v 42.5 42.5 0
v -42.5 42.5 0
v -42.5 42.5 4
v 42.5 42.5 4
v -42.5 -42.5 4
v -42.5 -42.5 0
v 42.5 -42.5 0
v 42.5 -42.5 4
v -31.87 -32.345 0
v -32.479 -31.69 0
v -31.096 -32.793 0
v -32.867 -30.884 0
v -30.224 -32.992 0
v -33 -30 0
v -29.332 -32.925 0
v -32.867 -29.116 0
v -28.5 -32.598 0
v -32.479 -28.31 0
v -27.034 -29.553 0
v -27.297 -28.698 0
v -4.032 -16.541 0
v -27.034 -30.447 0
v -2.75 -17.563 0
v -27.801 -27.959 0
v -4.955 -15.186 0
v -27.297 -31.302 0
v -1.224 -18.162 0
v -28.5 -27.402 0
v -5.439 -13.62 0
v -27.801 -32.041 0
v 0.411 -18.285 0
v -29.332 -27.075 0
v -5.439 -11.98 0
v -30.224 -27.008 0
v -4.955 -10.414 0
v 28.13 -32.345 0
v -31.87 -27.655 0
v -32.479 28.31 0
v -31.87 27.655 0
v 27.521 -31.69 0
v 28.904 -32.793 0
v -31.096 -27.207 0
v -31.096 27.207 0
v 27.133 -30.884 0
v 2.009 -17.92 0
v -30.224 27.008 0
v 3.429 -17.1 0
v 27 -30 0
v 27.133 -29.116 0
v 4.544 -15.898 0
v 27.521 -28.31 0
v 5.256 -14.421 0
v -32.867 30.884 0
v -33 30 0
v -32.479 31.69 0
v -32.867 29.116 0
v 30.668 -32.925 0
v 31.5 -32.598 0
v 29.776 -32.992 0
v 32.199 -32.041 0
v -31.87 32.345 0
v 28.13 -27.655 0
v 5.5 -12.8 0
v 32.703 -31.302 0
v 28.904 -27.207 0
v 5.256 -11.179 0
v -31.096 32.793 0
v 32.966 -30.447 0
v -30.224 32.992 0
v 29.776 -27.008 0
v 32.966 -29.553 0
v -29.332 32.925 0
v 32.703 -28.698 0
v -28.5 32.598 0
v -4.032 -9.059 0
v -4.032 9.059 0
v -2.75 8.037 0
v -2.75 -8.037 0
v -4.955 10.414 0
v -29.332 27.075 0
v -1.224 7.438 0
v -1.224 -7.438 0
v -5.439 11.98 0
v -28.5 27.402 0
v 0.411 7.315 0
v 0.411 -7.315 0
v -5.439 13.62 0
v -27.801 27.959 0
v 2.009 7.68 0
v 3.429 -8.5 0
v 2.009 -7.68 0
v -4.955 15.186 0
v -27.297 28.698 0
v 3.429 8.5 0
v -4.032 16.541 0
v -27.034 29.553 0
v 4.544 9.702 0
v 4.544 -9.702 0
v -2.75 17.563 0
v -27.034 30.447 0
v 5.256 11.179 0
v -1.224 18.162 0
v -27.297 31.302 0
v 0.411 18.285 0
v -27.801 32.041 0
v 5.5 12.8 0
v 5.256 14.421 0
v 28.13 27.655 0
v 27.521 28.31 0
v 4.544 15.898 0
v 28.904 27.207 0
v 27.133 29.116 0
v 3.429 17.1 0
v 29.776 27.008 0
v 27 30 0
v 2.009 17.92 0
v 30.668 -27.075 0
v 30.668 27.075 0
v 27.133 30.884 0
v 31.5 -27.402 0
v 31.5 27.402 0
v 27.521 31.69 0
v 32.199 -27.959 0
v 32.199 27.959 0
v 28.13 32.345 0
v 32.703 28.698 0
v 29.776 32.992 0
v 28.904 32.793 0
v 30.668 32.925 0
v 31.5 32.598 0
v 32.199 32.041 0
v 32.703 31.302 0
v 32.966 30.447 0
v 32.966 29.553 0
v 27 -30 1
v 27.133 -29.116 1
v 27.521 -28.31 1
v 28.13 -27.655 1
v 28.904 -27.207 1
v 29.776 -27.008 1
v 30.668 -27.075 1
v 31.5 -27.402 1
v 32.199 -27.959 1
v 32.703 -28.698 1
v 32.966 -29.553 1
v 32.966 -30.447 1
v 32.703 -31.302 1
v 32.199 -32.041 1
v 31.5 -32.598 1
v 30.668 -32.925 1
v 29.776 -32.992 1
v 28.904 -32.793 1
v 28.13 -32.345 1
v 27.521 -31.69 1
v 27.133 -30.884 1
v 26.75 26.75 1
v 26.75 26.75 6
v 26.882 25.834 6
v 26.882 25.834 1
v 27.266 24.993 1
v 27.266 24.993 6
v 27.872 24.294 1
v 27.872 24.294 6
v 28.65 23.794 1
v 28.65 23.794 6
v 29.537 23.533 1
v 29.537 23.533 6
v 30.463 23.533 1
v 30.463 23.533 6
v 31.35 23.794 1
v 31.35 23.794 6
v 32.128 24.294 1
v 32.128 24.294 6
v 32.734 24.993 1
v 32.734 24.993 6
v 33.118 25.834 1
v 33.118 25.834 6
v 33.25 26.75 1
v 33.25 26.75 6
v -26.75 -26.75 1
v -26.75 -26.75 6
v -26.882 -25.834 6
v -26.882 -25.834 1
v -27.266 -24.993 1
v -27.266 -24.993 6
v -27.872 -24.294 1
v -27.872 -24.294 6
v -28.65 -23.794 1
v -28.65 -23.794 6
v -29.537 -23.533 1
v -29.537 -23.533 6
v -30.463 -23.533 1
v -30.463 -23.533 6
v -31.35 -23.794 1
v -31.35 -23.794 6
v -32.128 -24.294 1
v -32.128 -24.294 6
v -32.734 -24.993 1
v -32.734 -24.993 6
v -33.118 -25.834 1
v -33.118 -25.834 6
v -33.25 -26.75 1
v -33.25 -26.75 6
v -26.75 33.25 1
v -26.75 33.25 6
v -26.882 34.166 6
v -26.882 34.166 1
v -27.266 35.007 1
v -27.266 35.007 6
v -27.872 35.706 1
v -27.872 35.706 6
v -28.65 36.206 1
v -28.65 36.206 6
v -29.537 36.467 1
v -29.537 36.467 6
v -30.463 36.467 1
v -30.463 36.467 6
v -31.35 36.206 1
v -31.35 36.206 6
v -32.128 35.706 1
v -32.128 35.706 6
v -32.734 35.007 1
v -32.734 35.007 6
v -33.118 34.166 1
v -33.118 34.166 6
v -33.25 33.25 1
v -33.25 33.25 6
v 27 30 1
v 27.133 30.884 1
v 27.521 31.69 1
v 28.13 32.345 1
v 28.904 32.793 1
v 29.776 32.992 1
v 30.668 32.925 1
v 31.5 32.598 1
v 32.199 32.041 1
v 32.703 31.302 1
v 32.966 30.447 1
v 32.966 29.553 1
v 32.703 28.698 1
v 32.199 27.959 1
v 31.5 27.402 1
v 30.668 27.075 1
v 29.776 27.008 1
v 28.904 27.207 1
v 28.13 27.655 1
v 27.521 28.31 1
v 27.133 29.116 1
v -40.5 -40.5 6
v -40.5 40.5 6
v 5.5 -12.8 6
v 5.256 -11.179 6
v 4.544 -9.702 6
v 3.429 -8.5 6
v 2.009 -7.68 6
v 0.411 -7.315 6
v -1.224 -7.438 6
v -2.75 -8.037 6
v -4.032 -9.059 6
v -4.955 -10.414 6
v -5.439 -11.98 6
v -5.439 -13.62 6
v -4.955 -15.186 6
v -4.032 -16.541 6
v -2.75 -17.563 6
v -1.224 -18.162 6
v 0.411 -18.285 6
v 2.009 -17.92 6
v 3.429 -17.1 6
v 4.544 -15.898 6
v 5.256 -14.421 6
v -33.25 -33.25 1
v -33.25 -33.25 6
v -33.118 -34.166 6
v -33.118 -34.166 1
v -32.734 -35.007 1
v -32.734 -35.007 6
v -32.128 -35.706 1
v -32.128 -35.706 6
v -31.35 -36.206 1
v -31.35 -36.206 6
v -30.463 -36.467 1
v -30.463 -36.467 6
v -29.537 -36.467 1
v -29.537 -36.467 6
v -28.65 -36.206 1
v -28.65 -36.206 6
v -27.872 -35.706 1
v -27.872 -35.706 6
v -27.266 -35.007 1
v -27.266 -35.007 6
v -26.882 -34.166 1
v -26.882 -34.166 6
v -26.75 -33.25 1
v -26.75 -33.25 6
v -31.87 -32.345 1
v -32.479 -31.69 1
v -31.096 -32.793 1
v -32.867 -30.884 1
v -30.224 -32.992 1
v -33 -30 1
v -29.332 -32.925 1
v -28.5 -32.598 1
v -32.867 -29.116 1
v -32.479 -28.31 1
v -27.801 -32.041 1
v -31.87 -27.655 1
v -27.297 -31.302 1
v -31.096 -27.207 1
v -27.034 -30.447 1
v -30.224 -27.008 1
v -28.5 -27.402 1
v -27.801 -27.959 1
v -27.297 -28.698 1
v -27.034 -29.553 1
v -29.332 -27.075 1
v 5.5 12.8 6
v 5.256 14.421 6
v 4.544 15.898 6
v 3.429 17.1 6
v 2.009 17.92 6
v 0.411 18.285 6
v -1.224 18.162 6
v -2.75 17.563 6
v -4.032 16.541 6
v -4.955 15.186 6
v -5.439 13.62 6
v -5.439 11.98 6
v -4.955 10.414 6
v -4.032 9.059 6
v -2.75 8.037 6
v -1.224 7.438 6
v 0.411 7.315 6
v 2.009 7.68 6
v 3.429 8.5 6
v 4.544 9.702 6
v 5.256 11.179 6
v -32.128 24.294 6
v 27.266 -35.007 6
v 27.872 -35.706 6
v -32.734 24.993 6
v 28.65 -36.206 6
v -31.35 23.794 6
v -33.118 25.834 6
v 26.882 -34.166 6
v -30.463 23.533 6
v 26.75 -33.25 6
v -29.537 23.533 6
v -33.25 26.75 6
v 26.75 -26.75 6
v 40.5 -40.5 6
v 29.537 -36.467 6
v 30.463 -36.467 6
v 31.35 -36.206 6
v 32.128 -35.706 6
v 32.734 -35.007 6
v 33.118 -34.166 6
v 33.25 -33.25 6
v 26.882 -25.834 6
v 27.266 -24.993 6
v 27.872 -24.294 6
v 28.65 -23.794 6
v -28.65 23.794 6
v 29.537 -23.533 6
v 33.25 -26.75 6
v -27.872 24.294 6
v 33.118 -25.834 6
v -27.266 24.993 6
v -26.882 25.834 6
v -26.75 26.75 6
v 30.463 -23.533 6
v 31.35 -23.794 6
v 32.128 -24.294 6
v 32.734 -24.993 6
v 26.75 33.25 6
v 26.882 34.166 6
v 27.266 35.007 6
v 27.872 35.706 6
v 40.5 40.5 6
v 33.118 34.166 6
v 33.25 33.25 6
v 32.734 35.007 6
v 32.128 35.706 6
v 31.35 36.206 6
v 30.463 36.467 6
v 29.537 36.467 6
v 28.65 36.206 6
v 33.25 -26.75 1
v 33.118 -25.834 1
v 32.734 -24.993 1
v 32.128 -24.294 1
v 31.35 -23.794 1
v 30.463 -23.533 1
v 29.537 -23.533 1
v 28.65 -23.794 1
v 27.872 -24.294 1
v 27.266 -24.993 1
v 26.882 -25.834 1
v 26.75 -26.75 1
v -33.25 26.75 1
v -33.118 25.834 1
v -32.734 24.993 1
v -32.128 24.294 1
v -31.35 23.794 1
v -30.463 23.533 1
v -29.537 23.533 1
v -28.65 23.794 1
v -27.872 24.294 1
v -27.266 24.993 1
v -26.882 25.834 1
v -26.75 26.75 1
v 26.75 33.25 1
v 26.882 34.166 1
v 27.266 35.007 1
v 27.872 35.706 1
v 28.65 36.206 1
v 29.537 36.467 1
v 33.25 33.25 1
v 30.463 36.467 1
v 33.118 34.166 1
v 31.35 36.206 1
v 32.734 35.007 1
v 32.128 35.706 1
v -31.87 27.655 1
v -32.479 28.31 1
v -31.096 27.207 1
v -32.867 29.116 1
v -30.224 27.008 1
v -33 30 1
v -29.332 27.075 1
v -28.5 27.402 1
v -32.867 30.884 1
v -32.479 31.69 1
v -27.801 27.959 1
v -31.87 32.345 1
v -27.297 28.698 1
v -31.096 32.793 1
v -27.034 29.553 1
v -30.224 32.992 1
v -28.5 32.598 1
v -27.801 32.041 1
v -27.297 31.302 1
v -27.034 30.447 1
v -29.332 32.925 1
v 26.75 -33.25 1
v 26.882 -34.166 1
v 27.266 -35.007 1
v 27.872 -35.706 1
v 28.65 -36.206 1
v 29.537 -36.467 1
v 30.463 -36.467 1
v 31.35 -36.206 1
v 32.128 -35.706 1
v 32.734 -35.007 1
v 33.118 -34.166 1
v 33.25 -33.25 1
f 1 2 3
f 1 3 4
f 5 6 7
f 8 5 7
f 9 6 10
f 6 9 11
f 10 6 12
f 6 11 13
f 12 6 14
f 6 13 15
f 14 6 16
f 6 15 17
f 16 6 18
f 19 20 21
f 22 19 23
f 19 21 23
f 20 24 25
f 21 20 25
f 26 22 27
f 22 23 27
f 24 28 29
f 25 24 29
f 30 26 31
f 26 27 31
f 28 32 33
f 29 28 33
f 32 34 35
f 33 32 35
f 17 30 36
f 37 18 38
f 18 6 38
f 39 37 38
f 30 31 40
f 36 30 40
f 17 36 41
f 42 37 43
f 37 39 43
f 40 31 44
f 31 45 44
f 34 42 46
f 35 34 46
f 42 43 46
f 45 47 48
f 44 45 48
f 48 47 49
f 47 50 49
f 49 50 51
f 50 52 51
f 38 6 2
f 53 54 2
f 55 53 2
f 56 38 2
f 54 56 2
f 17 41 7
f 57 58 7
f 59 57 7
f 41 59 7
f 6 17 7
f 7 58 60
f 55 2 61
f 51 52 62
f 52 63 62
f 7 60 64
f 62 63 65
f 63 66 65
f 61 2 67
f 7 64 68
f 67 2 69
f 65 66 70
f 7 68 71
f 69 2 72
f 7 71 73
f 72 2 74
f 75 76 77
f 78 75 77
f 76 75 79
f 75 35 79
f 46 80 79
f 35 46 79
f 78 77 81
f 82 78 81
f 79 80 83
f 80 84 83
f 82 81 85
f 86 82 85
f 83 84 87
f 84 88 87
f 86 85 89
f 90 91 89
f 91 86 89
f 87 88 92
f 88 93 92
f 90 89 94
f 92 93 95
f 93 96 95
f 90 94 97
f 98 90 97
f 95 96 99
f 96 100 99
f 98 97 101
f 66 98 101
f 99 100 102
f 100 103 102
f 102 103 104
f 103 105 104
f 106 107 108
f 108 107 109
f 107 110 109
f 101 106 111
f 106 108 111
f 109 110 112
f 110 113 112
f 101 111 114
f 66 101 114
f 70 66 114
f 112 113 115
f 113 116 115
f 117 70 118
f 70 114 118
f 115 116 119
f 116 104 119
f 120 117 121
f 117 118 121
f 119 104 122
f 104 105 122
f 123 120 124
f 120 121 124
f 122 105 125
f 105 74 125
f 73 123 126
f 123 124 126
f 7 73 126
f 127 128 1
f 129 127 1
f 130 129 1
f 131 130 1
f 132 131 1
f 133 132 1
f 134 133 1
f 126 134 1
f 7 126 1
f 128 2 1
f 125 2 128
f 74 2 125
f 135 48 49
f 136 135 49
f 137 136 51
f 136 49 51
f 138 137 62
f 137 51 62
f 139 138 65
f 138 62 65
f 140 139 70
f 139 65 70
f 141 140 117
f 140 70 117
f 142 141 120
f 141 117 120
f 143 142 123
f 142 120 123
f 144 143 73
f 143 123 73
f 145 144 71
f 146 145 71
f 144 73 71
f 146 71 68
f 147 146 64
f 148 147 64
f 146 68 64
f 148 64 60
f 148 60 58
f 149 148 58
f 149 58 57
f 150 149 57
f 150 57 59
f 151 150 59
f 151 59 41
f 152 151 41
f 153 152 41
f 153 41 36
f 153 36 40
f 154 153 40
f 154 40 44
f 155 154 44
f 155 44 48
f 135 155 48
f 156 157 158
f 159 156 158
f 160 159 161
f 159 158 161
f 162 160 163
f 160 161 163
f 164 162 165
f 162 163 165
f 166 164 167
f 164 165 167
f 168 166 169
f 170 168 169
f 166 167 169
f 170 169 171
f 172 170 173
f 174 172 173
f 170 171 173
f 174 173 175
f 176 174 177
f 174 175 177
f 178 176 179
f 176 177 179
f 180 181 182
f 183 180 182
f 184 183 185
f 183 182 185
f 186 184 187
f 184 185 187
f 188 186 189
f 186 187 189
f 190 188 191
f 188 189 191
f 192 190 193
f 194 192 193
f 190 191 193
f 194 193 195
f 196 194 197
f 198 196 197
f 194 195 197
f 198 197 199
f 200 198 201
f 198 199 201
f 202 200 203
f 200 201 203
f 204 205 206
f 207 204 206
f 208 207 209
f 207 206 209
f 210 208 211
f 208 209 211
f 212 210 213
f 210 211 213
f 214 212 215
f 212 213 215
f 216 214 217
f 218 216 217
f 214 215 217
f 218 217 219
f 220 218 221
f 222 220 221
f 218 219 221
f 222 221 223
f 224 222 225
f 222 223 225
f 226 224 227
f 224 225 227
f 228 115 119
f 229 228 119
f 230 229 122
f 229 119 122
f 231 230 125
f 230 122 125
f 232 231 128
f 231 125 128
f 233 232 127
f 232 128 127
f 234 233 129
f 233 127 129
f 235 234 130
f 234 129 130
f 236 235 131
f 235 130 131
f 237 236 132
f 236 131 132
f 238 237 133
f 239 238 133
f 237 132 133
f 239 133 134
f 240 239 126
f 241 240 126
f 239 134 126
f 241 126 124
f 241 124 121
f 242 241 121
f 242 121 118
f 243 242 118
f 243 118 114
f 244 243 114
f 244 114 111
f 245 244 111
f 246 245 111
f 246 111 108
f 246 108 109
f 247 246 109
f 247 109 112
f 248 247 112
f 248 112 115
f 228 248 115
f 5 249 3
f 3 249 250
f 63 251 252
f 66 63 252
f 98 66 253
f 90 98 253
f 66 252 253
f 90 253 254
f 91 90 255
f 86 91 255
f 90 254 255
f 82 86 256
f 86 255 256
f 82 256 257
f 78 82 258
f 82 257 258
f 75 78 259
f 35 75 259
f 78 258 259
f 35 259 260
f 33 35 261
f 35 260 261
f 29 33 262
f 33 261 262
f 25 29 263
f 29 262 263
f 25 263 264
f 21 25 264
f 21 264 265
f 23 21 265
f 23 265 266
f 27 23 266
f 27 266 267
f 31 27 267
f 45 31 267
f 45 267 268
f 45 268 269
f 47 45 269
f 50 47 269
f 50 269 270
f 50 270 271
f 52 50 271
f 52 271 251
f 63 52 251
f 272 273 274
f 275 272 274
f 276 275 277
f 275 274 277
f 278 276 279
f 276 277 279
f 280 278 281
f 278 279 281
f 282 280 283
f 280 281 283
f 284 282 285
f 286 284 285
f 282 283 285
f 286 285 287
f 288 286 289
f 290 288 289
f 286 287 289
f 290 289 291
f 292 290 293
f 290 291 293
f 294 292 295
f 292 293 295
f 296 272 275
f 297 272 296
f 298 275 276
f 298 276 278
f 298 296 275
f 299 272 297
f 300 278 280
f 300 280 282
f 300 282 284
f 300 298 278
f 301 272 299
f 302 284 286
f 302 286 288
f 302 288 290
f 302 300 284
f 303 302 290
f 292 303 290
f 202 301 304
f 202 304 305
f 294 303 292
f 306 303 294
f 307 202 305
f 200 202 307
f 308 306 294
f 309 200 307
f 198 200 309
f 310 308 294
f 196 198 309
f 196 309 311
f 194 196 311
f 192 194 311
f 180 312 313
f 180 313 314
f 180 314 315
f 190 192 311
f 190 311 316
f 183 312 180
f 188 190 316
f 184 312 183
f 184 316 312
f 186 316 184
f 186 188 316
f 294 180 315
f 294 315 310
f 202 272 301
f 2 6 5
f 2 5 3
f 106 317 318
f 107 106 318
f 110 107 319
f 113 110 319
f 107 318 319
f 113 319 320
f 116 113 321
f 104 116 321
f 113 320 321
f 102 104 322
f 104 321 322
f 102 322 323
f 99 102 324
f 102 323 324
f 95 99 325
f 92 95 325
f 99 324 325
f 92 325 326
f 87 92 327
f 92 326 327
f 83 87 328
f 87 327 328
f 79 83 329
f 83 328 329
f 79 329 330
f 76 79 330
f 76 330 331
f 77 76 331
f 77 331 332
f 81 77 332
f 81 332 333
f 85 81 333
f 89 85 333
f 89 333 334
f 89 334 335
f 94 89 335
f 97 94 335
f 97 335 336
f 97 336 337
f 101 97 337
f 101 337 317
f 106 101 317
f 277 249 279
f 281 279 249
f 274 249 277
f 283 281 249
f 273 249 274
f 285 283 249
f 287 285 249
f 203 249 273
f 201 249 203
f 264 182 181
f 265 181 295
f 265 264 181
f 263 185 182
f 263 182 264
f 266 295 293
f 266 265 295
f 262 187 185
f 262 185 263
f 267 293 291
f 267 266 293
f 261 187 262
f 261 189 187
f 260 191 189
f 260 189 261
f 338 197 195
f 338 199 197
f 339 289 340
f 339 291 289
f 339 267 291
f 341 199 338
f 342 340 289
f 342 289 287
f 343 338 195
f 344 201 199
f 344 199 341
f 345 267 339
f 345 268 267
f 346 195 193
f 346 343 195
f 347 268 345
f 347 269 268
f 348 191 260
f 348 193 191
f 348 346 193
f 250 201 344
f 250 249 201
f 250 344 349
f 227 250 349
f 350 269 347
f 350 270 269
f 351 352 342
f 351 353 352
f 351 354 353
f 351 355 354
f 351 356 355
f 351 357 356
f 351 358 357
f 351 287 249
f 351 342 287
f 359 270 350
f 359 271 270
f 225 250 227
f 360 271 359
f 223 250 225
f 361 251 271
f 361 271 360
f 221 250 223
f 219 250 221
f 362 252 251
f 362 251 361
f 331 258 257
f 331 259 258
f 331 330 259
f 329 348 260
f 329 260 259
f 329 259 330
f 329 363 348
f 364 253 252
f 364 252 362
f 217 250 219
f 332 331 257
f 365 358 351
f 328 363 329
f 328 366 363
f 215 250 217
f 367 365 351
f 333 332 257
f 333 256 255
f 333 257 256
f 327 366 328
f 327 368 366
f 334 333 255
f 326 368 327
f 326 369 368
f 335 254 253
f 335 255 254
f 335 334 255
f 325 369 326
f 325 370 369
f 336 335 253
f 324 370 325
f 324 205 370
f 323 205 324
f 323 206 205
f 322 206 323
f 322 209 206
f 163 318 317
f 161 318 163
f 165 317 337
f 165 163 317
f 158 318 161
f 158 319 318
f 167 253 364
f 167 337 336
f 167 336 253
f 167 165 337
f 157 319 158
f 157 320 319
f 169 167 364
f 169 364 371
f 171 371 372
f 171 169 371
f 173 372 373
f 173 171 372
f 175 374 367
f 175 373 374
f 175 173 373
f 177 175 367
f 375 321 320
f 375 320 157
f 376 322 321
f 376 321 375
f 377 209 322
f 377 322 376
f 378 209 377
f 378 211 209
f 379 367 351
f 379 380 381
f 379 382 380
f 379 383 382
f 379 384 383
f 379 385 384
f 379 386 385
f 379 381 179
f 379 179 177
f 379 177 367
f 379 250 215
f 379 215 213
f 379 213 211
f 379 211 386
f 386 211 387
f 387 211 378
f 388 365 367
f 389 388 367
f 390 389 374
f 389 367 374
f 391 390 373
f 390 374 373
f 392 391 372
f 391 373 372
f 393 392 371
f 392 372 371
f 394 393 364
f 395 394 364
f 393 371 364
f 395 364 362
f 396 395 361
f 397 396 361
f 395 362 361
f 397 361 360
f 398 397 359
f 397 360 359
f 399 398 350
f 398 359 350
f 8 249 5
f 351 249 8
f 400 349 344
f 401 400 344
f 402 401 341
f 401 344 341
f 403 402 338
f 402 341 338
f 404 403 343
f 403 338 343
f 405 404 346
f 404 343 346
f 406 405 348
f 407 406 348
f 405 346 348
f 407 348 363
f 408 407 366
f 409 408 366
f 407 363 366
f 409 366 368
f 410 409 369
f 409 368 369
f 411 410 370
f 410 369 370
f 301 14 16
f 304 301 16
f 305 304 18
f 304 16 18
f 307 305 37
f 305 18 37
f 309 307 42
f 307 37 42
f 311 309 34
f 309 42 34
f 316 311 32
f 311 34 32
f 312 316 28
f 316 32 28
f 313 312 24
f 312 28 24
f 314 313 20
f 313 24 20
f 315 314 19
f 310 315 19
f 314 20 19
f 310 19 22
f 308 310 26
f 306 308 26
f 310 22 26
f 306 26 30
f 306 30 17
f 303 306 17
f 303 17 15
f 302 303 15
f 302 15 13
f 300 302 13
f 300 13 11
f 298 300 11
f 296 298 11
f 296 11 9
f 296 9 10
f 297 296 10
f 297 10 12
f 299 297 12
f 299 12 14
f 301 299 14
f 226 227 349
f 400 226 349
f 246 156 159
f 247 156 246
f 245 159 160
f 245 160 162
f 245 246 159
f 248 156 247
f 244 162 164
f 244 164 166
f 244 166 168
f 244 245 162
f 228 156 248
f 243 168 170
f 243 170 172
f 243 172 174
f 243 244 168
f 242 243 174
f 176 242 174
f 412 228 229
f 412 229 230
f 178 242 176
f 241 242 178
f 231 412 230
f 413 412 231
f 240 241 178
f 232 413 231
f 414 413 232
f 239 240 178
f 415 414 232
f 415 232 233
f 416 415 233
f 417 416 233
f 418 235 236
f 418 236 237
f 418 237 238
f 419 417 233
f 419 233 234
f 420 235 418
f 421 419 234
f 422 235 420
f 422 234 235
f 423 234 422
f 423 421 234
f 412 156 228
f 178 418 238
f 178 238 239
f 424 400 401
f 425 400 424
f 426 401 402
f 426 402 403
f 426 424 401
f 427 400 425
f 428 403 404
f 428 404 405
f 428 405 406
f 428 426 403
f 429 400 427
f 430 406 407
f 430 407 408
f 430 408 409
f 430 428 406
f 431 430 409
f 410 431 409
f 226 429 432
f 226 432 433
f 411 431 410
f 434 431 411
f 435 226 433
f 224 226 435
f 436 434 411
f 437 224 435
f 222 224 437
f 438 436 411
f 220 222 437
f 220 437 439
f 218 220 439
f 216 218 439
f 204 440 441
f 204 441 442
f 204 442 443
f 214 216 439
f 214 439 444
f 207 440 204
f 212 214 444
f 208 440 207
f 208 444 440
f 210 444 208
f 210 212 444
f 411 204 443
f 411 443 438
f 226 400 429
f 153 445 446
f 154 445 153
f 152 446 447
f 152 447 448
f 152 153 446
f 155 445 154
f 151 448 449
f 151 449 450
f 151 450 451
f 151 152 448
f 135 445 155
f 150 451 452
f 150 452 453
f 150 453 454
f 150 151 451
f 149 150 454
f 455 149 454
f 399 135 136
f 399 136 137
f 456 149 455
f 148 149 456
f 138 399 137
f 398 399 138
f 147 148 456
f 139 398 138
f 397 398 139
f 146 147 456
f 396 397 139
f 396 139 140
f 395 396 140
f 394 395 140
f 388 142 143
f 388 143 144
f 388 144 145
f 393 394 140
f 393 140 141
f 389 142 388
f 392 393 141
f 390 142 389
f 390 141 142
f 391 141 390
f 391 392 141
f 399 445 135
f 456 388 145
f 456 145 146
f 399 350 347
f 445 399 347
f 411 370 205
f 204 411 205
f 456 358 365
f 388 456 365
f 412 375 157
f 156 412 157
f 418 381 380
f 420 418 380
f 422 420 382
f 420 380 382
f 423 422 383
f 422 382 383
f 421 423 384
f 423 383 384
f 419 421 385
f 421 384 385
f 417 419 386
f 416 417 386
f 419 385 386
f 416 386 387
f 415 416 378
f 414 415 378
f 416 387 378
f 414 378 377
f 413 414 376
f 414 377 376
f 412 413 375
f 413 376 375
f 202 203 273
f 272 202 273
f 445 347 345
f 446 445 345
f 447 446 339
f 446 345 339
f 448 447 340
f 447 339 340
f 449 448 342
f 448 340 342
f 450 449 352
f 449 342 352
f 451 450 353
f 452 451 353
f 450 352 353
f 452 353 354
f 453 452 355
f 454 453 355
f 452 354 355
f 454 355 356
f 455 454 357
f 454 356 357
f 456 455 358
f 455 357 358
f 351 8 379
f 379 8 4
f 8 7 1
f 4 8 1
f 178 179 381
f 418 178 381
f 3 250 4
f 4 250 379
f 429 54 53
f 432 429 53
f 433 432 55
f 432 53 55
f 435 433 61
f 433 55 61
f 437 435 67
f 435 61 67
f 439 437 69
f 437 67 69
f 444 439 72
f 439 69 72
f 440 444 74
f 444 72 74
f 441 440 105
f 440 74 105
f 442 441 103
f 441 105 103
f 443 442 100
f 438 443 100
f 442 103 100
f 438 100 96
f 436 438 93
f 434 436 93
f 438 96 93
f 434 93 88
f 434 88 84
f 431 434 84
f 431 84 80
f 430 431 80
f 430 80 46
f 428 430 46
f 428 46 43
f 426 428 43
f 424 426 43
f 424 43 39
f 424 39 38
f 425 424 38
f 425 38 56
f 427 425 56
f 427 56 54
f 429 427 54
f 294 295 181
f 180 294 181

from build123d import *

# Parameters (mm, degrees)
F0_W     = 85
F0_H     = 85
F1_DEPTH = 6
F2_R     = 5.5
F3_DEPTH = 6.001
F5_D     = 6
F6_SIZE  = 2
F8_DEPTH = 5


with BuildPart() as f1:
    # F0 (on Top) → F1 (new body)
    with BuildSketch(Plane.XY):
        Rectangle(F0_W, F0_H)
    extrude(amount=F1_DEPTH)

    # F2 (on face) → F3 (cut, through all)
    with BuildSketch(Plane.XY.offset(6)):
        with Locations((0, 12.8)):
            Circle(F2_R)
        with Locations((0, -12.8)):
            Circle(F2_R)
    extrude(amount=-F3_DEPTH, mode=Mode.SUBTRACT)

    # F5 (through all)
    with Locations(Plane.XY.offset(6)):
        with Locations((-30, -30), (-30, 30), (30, 30), (30, -30)):
            Hole(F5_D / 2)

    # F6
    f6_edges = [f1.edges().sort_by_distance(p)[0] for p in [
        (-42.5, 0, 6),
        (0, -42.5, 6),
        (42.5, 0, 6),
        (0, 42.5, 6),
    ]]
    chamfer(f6_edges, length=F6_SIZE)

    # F7 (on face) → F8 (cut)
    with BuildSketch(Plane.XY.offset(6)):
        with BuildLine():
            ThreePointArc((33.25, 33.25), (30, 36.5), (26.75, 33.25))
            Line((26.75, 33.25), (26.75, 26.75))
            ThreePointArc((26.75, 26.75), (30, 23.5), (33.25, 26.75))
            Line((33.25, 26.75), (33.25, 33.25))
        make_face()
        with BuildLine():
            Line((-26.75, 26.75), (-26.75, 33.25))
            ThreePointArc((-26.75, 33.25), (-30, 36.5), (-33.25, 33.25))
            Line((-33.25, 33.25), (-33.25, 26.75))
            ThreePointArc((-33.25, 26.75), (-30, 23.5), (-26.75, 26.75))
        make_face()
        with BuildLine():
            Line((26.75, -26.75), (26.75, -33.25))
            ThreePointArc((26.75, -33.25), (30, -36.5), (33.25, -33.25))
            Line((33.25, -33.25), (33.25, -26.75))
            ThreePointArc((33.25, -26.75), (30, -23.5), (26.75, -26.75))
        make_face()
        with BuildLine():
            ThreePointArc((-33.25, -33.25), (-30, -36.5), (-26.75, -33.25))
            Line((-26.75, -33.25), (-26.75, -26.75))
            ThreePointArc((-26.75, -26.75), (-30, -23.5), (-33.25, -26.75))
            Line((-33.25, -26.75), (-33.25, -33.25))
        make_face()
    extrude(amount=-F8_DEPTH, mode=Mode.SUBTRACT)


solid = f1.part
